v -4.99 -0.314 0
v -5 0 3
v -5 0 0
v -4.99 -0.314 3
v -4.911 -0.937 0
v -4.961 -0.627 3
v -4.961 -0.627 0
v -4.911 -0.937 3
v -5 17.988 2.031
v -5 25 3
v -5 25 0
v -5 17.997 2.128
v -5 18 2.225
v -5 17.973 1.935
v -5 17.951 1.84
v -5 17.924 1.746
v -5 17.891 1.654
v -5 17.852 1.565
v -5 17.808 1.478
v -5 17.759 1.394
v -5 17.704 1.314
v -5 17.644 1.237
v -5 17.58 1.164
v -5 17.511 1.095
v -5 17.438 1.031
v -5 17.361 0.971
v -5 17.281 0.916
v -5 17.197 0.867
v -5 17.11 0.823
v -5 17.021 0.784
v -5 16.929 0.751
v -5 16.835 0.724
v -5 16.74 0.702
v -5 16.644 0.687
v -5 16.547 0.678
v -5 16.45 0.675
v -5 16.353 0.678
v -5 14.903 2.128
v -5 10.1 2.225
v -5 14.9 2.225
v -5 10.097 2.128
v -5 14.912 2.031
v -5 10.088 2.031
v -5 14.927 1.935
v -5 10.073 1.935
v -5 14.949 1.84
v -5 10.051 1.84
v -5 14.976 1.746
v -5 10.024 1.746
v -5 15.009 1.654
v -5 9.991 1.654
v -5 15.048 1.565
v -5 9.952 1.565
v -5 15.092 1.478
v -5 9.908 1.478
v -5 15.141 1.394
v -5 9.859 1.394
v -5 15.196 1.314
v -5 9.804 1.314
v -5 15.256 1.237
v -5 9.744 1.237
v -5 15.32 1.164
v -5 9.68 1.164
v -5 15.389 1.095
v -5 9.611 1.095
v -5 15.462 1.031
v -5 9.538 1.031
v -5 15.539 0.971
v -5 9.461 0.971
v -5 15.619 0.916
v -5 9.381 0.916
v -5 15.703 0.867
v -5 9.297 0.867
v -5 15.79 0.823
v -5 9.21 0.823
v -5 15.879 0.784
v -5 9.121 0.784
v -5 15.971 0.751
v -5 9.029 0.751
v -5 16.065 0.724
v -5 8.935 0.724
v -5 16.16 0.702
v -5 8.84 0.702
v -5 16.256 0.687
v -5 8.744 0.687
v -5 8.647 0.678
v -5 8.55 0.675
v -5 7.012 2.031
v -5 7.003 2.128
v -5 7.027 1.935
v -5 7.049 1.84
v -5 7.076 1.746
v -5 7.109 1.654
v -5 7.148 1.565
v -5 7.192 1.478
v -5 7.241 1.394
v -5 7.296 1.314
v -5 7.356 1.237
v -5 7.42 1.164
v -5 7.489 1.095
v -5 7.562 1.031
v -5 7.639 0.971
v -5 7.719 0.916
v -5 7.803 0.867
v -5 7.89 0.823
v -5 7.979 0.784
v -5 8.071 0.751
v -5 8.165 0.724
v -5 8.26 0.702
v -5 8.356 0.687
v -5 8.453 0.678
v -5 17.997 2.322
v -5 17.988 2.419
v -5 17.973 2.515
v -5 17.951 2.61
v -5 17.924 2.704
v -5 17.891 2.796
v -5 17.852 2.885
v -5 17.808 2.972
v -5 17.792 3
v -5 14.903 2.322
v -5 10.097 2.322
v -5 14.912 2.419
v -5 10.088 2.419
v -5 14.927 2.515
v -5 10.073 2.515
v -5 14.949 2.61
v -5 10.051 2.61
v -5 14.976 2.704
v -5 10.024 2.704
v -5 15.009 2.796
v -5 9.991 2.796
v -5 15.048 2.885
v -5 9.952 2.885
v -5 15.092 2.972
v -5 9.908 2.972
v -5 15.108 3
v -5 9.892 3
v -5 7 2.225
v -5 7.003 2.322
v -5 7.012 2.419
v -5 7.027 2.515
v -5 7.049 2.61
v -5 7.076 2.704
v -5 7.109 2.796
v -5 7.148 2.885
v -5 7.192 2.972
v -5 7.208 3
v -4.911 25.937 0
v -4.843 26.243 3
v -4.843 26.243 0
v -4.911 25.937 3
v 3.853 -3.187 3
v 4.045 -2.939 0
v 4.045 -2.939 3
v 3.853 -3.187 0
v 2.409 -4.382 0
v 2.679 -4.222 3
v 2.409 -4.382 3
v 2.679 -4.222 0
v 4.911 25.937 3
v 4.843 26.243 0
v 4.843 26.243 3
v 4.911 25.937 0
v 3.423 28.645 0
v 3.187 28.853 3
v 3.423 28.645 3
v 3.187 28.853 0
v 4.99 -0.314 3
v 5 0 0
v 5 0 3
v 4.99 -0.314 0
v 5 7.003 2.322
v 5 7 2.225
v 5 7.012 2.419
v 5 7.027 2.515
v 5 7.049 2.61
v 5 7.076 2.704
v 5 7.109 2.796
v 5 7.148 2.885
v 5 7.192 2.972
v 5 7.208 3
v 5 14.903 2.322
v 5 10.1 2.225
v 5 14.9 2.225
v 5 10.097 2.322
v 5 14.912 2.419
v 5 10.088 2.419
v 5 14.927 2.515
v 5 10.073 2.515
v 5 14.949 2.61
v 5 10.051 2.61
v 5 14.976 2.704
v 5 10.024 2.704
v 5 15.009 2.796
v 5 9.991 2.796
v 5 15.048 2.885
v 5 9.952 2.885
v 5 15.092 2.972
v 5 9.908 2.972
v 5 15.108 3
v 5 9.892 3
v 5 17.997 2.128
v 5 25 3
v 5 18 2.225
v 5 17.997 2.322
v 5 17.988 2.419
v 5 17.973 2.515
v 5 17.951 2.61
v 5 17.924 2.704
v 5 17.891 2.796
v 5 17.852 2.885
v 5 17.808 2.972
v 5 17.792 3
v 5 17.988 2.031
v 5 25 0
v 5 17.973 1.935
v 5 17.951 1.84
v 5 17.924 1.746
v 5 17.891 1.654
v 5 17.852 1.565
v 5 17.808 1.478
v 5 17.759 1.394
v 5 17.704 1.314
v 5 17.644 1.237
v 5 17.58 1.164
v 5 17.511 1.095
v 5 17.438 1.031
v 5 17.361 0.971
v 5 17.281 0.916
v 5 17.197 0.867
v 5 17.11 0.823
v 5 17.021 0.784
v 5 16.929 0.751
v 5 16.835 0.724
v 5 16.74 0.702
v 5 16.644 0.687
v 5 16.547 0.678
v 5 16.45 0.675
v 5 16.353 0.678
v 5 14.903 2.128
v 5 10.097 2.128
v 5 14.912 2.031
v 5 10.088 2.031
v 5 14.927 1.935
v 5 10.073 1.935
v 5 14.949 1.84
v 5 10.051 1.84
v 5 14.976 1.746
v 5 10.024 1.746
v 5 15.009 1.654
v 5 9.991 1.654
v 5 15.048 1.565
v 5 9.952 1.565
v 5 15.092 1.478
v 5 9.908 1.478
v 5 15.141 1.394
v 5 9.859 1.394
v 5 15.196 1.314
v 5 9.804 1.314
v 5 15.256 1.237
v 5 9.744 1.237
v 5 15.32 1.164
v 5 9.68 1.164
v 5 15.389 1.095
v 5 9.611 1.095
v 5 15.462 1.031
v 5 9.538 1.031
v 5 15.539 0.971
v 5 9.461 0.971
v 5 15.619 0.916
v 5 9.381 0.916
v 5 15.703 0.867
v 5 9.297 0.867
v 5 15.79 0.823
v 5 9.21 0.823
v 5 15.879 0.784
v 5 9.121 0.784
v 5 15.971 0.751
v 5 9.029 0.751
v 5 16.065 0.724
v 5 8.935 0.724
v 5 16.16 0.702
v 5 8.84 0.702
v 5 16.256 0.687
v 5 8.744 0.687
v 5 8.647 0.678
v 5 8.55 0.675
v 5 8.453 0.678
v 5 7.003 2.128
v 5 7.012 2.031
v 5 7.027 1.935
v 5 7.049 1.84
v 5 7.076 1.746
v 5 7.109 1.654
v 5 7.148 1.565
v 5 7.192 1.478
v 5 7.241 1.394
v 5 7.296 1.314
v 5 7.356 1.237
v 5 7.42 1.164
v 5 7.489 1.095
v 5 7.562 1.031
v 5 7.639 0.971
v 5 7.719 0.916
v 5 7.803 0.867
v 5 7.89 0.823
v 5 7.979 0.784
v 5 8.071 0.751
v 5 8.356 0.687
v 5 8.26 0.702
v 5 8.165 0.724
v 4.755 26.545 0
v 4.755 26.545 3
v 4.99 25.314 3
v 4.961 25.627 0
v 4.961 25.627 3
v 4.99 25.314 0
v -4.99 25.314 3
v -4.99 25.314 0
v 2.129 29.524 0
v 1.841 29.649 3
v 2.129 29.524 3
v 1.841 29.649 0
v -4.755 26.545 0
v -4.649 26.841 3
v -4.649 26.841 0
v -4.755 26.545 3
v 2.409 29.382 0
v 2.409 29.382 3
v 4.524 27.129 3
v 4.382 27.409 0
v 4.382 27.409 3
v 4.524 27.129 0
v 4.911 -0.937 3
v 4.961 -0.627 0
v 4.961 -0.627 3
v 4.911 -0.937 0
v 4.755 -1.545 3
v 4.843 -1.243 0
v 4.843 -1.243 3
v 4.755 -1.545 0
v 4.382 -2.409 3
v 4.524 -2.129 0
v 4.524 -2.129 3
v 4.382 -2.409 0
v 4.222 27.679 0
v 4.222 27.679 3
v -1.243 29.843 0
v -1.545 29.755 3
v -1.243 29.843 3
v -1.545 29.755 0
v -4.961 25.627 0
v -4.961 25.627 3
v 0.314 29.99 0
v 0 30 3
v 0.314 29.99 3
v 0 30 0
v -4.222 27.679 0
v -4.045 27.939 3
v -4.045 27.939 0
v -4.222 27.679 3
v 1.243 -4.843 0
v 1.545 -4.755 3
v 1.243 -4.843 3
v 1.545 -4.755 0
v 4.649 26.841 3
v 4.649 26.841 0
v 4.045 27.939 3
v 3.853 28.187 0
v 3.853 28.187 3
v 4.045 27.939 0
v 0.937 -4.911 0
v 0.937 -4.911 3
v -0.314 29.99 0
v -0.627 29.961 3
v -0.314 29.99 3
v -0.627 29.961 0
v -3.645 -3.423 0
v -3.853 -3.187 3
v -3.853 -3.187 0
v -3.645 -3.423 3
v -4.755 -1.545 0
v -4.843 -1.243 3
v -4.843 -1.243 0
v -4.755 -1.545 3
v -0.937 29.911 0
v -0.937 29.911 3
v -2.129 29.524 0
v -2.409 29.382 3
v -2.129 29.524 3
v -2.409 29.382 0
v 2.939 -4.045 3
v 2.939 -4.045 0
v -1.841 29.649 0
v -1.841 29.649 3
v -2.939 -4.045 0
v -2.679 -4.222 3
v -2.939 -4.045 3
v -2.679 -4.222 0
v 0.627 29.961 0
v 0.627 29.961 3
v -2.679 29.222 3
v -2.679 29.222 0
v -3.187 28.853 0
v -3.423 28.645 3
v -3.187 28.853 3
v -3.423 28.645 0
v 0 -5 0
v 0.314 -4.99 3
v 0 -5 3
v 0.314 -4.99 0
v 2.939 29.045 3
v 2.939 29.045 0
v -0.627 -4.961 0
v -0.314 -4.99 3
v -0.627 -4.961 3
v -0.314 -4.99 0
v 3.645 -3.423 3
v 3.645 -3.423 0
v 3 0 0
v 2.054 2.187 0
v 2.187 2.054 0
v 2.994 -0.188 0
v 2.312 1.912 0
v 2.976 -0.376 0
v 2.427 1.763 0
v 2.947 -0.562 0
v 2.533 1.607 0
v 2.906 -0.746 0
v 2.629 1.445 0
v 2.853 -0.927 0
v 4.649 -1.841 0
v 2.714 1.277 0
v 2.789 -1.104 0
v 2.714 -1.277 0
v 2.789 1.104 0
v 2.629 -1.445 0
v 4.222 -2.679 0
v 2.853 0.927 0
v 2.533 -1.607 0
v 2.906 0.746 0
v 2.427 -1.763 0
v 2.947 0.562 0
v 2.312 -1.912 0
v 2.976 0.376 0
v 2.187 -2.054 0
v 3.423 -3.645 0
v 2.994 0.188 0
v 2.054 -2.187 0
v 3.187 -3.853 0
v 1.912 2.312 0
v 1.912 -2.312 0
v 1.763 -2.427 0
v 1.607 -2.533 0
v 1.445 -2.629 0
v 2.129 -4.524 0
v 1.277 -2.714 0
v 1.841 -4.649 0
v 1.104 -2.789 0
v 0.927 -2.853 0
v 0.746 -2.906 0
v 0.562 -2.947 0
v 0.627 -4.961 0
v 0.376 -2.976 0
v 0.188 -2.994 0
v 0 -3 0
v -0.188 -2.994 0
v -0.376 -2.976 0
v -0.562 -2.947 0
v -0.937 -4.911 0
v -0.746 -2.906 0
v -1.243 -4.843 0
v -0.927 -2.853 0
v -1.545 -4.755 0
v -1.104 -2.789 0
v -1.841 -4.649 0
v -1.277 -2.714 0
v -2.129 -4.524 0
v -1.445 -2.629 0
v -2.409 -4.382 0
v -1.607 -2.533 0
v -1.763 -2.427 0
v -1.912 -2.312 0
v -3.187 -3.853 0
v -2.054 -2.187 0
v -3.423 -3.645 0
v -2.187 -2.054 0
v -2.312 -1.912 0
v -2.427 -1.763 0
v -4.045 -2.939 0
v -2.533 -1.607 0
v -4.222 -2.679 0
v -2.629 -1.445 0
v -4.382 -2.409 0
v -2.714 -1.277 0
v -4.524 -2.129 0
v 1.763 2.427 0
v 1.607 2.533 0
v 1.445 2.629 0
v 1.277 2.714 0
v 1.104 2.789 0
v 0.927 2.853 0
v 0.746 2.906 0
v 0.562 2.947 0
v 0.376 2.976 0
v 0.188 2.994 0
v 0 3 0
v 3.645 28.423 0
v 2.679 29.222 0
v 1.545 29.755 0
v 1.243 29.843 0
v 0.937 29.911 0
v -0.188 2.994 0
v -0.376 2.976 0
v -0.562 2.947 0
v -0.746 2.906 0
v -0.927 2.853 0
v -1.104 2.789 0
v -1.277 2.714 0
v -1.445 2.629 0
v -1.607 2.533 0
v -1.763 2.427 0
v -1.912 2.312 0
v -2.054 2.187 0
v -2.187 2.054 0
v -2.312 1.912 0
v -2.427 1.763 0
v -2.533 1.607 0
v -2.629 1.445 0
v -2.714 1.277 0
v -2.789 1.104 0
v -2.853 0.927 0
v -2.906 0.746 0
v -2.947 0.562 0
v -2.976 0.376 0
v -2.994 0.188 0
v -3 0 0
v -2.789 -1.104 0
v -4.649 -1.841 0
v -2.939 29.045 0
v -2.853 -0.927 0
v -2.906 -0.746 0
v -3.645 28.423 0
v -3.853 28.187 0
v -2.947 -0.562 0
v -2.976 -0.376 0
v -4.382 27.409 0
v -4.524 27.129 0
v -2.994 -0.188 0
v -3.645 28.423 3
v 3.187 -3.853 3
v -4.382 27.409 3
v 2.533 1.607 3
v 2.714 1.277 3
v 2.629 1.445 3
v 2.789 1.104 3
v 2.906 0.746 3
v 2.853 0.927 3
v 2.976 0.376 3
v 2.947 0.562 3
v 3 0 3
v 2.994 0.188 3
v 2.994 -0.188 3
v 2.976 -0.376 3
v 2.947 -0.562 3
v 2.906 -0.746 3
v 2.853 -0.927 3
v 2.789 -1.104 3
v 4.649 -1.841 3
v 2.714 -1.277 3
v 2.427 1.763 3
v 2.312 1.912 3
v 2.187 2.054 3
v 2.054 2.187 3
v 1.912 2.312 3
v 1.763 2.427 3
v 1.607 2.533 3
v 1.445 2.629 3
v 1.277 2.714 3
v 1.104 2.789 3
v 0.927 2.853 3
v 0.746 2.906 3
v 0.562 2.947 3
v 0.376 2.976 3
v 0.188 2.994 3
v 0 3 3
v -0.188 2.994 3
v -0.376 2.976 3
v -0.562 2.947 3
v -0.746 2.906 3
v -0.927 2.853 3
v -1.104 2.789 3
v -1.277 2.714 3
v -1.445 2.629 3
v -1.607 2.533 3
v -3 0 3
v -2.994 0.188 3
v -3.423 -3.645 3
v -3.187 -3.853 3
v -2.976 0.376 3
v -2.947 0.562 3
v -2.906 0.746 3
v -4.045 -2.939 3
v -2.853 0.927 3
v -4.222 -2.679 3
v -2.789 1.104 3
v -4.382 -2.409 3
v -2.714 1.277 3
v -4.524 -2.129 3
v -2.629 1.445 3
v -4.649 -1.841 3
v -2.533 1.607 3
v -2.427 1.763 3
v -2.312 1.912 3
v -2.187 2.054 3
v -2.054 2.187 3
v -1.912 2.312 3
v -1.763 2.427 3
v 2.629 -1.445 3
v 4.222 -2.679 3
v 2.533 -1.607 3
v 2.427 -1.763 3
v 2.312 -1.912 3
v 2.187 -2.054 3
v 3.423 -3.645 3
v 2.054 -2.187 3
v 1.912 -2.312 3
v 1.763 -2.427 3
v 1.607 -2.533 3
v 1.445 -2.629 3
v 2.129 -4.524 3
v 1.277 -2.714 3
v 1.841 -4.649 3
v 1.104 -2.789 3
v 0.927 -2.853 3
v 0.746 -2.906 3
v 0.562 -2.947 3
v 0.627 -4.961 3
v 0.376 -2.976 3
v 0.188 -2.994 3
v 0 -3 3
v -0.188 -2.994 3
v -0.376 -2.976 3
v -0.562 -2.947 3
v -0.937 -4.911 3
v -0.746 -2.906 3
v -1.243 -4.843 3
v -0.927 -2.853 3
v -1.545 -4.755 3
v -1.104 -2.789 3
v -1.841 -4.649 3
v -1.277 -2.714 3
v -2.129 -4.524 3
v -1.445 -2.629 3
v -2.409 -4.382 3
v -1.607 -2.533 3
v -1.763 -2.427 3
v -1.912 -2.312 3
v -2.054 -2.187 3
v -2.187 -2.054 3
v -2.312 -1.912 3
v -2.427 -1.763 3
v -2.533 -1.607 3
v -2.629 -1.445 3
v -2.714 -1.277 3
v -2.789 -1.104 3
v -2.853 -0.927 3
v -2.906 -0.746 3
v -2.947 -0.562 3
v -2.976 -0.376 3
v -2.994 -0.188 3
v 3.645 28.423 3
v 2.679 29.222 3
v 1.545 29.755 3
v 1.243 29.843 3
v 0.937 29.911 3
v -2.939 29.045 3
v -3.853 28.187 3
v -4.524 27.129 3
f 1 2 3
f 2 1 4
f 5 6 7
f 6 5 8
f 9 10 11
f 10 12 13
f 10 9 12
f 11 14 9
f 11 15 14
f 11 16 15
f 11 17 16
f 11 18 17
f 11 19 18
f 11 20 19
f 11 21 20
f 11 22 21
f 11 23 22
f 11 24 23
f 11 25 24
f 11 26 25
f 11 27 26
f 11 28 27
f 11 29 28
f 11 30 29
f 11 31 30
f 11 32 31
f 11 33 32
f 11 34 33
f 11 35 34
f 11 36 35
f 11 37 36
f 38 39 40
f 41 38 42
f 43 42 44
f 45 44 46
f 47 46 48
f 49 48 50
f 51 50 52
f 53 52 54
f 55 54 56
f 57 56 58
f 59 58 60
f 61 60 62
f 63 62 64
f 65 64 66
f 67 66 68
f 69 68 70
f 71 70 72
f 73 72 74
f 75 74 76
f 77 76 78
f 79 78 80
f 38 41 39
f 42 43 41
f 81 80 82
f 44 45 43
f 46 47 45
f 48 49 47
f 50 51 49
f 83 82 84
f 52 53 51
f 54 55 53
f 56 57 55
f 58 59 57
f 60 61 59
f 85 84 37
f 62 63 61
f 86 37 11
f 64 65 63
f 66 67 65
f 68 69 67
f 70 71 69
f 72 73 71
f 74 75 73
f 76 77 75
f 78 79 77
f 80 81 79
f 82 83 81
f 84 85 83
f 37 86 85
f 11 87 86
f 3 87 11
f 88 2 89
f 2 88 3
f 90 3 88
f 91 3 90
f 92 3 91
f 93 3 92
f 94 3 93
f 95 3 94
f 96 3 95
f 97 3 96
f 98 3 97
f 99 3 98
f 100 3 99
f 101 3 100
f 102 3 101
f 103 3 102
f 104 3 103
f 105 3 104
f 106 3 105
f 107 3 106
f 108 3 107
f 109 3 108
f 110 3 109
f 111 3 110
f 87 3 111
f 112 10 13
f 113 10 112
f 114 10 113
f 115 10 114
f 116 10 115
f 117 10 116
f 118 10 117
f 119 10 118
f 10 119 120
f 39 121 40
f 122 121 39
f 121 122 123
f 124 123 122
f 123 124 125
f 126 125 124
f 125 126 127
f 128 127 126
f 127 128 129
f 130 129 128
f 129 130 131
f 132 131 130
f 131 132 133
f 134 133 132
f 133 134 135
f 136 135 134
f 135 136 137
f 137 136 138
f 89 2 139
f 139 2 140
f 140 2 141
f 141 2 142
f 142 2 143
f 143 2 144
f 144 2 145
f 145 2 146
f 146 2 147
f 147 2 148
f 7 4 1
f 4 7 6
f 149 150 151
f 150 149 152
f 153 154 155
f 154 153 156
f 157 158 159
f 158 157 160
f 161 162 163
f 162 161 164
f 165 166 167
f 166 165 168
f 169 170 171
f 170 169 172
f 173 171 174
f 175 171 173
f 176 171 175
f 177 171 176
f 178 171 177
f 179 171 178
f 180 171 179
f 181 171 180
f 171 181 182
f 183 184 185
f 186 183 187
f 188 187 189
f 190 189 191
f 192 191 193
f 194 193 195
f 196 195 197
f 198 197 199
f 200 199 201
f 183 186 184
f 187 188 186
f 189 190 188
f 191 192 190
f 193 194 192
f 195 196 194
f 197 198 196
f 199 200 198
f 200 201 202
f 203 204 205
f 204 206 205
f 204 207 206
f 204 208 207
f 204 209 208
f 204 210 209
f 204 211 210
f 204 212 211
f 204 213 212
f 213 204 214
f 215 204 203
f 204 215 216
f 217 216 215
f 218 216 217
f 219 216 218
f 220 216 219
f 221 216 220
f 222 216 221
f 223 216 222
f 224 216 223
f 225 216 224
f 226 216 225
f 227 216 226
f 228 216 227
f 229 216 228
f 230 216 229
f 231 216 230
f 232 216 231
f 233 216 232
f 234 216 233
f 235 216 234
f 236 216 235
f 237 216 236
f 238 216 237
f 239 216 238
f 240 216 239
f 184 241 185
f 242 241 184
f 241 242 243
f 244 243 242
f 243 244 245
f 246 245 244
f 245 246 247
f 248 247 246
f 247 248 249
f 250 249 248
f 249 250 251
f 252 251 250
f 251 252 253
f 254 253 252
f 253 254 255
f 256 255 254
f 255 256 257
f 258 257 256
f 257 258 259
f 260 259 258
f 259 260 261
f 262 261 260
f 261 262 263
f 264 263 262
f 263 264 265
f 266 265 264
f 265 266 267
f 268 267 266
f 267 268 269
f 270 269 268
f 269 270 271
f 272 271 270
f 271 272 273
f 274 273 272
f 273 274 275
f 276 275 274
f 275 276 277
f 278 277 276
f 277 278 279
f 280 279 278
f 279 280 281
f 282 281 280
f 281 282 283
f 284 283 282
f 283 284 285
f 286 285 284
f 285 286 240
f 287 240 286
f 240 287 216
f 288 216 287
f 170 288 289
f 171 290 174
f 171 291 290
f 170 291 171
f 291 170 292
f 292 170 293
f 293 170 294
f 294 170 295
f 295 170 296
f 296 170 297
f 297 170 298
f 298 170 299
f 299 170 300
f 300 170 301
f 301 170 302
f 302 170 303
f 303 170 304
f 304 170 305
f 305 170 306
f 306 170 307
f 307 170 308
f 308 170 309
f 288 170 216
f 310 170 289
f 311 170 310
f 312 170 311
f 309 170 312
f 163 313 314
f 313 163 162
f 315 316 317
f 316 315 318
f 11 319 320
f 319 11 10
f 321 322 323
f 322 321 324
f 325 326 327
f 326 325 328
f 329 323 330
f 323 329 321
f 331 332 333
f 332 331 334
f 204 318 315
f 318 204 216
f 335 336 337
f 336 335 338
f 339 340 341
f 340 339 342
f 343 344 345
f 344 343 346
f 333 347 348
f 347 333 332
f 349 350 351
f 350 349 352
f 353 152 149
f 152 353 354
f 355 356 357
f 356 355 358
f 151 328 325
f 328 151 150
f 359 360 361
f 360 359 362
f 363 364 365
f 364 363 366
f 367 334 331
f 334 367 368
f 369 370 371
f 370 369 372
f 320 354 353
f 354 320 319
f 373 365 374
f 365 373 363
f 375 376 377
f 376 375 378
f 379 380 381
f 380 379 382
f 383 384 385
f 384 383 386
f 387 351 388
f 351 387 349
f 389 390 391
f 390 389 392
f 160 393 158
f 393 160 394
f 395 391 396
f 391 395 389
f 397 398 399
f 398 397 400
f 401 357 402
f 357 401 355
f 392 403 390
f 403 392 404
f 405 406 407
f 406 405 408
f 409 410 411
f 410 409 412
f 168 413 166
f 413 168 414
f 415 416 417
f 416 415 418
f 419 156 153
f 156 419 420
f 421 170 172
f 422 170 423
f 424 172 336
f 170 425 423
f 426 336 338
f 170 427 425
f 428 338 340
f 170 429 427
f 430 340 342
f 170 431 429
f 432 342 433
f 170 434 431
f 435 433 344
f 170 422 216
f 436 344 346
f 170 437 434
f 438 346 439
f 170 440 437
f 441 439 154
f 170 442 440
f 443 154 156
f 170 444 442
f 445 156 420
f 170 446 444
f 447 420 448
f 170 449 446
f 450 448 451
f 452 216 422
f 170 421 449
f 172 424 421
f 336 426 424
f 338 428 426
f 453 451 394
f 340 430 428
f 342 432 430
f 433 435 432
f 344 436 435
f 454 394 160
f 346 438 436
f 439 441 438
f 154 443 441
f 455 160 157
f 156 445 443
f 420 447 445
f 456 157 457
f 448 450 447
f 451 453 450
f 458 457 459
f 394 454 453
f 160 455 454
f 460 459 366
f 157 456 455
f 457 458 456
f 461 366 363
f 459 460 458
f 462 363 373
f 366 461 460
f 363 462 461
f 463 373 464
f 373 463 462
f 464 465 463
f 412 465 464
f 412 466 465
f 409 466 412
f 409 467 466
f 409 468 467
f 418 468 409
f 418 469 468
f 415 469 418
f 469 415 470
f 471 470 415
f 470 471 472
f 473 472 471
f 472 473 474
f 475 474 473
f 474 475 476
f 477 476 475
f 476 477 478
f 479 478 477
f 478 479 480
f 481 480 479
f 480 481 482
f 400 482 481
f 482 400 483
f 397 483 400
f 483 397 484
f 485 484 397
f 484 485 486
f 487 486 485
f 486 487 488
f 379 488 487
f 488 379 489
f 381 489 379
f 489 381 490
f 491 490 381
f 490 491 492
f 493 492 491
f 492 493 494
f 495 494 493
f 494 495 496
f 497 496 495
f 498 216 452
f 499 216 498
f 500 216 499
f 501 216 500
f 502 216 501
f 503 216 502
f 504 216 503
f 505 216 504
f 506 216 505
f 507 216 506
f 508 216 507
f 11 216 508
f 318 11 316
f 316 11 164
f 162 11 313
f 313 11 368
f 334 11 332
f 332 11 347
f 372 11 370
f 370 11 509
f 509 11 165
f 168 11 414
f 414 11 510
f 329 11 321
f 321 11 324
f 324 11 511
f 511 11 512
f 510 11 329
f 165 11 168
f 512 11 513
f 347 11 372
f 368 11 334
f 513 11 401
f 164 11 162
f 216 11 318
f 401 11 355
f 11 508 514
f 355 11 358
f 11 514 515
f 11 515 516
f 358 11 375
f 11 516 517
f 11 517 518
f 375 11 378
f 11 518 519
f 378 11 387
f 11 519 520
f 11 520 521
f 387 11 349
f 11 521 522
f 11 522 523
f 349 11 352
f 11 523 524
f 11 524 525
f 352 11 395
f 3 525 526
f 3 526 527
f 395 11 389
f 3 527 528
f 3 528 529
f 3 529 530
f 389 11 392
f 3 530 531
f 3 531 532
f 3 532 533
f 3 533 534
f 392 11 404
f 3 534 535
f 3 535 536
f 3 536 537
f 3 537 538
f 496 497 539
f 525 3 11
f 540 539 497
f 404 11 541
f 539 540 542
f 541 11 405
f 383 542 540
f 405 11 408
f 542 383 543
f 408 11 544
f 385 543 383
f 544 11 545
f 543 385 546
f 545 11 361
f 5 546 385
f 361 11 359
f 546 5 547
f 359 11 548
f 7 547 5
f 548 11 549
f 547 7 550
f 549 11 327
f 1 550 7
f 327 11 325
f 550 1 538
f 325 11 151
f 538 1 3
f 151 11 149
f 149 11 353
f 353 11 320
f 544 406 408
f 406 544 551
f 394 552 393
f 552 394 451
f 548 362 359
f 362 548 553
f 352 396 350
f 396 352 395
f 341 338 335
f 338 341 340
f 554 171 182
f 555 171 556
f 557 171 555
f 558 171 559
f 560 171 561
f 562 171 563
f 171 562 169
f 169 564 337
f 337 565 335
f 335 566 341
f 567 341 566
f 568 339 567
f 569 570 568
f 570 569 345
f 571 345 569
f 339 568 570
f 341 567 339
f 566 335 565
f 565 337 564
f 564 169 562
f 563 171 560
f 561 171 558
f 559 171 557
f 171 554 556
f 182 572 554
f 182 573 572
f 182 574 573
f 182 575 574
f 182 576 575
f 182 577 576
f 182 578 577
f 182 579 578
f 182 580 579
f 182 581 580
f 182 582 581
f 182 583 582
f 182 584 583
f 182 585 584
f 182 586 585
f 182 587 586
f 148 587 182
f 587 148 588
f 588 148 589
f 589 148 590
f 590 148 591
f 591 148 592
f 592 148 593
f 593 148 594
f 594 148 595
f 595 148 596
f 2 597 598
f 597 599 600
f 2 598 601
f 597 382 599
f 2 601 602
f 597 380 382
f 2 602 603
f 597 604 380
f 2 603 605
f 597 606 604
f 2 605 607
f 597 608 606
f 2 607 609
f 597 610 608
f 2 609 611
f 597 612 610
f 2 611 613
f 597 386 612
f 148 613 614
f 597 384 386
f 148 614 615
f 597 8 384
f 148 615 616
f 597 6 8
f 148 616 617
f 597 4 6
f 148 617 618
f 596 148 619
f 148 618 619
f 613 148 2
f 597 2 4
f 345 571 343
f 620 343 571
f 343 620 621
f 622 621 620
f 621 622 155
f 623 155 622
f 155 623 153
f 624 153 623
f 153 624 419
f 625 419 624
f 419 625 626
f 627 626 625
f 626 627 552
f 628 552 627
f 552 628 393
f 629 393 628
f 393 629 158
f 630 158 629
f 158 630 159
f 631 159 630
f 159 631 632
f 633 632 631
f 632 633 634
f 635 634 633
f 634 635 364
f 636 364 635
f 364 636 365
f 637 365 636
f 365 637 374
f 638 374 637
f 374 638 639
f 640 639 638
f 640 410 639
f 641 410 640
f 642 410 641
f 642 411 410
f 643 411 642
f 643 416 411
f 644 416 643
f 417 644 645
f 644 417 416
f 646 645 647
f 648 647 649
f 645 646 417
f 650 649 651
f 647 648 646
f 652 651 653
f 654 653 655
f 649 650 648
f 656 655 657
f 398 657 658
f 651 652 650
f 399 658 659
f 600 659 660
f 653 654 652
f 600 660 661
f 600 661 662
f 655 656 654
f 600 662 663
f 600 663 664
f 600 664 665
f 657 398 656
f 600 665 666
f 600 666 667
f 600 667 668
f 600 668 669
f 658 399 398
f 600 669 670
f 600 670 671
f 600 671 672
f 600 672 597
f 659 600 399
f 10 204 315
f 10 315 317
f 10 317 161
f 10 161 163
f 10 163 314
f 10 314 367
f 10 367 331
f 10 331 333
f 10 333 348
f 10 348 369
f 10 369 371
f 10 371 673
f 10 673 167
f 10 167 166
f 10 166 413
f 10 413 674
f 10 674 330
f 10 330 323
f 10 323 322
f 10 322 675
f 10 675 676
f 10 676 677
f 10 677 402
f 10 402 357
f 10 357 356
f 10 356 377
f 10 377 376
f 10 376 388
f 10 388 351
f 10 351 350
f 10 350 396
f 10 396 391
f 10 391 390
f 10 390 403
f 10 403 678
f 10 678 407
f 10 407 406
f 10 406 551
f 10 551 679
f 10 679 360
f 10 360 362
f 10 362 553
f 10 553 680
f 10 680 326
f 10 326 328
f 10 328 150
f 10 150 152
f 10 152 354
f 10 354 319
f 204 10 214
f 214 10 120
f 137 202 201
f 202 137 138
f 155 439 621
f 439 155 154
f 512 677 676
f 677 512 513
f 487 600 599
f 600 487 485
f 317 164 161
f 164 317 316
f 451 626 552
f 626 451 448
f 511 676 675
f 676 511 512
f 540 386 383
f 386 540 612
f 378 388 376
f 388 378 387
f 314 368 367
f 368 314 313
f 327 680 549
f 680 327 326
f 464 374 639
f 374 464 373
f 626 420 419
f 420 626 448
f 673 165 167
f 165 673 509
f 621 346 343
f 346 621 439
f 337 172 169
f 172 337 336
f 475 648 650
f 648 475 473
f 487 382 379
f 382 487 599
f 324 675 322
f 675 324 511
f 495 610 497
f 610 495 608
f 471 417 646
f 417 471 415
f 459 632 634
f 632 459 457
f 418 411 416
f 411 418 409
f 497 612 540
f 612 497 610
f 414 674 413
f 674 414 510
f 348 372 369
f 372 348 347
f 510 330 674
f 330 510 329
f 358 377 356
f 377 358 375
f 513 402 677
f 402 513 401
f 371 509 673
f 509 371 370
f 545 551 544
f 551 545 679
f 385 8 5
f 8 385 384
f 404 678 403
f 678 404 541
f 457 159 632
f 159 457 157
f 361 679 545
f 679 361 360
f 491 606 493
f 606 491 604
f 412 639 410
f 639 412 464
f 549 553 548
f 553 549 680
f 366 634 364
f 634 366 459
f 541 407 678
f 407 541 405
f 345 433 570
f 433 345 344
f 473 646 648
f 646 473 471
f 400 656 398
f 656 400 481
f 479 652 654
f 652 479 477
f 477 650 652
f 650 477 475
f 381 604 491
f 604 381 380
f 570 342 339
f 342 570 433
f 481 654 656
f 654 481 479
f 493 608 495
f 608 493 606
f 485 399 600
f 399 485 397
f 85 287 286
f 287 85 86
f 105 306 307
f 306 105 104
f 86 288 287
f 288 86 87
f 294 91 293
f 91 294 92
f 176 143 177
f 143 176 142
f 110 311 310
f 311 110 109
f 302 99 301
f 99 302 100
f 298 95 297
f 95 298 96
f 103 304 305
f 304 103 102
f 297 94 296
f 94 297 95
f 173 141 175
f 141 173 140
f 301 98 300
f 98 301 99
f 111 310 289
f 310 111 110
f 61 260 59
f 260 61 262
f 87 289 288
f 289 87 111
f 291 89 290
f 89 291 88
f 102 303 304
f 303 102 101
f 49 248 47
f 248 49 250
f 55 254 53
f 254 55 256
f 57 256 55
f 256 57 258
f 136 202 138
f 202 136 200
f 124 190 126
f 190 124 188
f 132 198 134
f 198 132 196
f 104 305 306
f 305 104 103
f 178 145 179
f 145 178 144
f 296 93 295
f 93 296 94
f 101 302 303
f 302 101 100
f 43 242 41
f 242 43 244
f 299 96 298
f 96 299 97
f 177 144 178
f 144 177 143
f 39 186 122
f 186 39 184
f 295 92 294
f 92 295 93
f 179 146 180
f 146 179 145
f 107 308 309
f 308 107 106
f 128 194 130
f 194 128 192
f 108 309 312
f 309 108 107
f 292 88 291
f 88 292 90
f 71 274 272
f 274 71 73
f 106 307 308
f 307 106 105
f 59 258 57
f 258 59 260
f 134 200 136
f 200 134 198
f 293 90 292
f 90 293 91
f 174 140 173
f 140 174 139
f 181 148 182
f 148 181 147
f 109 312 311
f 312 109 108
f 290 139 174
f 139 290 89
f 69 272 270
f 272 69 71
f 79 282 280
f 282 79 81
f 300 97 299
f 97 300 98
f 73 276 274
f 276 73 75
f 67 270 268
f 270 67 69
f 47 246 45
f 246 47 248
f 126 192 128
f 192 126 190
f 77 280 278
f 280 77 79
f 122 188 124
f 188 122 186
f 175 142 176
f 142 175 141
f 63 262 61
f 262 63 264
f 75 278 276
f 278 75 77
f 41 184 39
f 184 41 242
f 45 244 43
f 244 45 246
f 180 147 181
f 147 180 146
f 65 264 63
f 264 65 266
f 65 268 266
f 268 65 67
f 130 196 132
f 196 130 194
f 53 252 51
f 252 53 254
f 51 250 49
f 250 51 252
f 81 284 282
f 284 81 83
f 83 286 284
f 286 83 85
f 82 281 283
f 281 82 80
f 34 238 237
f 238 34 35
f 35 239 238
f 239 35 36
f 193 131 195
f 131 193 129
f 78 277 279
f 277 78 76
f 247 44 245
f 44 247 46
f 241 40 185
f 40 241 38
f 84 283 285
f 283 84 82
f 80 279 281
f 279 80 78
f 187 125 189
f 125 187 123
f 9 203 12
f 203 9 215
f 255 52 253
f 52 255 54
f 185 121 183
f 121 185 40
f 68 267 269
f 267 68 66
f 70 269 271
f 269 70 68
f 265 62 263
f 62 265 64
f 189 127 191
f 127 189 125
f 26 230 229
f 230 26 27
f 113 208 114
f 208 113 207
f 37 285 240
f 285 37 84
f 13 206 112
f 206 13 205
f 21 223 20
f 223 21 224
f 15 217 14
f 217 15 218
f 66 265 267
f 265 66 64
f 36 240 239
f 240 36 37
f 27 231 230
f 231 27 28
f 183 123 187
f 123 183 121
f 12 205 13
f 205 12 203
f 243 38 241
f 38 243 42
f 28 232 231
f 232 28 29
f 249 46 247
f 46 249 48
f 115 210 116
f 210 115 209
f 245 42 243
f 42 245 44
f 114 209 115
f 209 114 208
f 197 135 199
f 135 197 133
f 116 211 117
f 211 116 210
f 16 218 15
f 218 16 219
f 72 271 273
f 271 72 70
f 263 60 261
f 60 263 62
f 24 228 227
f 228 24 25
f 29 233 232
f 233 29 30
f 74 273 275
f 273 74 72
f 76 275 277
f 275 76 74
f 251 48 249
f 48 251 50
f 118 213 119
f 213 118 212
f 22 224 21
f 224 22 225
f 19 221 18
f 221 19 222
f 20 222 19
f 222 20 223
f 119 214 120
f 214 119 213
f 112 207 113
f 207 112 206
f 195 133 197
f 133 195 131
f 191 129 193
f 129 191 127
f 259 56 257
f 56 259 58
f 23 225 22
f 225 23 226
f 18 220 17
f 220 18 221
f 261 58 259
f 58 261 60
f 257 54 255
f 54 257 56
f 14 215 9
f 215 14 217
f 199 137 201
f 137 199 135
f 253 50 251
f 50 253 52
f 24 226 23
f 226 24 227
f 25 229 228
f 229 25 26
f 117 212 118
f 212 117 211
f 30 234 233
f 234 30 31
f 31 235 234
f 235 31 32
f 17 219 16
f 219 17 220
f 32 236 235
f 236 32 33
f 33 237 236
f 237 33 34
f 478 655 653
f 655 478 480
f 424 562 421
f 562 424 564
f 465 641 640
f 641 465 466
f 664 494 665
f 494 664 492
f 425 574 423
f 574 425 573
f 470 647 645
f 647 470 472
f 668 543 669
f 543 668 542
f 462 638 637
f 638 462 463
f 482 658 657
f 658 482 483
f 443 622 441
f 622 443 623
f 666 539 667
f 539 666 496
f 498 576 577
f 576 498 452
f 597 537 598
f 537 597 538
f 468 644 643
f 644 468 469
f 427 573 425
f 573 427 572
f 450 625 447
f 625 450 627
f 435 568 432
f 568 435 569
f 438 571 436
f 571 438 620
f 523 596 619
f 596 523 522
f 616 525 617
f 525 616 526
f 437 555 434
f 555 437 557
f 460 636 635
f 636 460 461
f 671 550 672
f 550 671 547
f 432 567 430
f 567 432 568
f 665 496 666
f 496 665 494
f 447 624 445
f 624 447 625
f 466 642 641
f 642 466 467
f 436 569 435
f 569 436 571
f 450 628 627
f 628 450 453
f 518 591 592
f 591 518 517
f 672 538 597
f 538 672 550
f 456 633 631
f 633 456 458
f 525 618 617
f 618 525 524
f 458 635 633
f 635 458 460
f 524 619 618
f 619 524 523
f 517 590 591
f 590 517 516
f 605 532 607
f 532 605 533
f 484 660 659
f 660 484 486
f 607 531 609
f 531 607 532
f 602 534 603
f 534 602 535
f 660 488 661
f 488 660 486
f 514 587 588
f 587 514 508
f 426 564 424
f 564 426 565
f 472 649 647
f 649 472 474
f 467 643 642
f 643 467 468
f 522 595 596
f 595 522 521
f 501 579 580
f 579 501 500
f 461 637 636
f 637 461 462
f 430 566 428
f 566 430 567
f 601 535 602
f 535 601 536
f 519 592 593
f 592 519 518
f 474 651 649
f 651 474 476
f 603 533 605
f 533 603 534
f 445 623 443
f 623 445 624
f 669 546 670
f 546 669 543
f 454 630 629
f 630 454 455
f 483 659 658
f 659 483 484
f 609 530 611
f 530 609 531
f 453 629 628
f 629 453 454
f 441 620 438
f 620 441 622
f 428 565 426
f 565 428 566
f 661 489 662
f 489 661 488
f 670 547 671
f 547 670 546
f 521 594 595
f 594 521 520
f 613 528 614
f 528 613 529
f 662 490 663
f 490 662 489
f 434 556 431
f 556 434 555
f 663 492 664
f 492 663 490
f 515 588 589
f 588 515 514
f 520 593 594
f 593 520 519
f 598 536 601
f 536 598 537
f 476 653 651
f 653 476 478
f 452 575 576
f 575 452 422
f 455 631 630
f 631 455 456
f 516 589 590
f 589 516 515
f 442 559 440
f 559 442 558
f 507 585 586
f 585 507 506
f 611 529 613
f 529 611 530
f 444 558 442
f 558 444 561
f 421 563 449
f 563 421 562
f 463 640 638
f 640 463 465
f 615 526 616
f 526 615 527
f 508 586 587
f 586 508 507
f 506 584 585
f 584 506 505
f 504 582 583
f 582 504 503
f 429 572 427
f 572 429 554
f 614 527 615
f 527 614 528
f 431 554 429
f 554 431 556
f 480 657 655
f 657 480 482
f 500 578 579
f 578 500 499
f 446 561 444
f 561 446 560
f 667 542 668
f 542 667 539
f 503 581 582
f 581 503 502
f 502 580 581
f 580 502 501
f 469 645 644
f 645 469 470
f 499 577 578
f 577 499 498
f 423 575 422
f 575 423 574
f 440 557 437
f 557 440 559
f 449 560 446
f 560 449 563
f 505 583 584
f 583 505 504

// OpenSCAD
$fn = 100;
hole_radius = 1.55;
external_diameter = 11.0;
plate_length = 25.0;
plate_thickness = 3;

difference() {
     linear_extrude(height=plate_thickness) union () {
	  circle(5);
	  translate([0,plate_length, 0]) circle(5);
	  translate([-5,0,0]) scale([1,plate_length/10,1]) square(10);
     }

     translate([-6,(plate_length-external_diameter)/2+hole_radius,plate_thickness-0.5*hole_radius])
	  rotate([0,90,0])
	  linear_extrude(height=12)
	  circle(hole_radius);

     translate([-6,plate_length-((plate_length-external_diameter)/2)-hole_radius,plate_thickness-0.5*hole_radius])
	  rotate([0,90,0])
	  linear_extrude(height=12)
	  circle(hole_radius);

     translate([0,0,-0.1]) linear_extrude(height=plate_thickness+0.2) circle(3);
}
